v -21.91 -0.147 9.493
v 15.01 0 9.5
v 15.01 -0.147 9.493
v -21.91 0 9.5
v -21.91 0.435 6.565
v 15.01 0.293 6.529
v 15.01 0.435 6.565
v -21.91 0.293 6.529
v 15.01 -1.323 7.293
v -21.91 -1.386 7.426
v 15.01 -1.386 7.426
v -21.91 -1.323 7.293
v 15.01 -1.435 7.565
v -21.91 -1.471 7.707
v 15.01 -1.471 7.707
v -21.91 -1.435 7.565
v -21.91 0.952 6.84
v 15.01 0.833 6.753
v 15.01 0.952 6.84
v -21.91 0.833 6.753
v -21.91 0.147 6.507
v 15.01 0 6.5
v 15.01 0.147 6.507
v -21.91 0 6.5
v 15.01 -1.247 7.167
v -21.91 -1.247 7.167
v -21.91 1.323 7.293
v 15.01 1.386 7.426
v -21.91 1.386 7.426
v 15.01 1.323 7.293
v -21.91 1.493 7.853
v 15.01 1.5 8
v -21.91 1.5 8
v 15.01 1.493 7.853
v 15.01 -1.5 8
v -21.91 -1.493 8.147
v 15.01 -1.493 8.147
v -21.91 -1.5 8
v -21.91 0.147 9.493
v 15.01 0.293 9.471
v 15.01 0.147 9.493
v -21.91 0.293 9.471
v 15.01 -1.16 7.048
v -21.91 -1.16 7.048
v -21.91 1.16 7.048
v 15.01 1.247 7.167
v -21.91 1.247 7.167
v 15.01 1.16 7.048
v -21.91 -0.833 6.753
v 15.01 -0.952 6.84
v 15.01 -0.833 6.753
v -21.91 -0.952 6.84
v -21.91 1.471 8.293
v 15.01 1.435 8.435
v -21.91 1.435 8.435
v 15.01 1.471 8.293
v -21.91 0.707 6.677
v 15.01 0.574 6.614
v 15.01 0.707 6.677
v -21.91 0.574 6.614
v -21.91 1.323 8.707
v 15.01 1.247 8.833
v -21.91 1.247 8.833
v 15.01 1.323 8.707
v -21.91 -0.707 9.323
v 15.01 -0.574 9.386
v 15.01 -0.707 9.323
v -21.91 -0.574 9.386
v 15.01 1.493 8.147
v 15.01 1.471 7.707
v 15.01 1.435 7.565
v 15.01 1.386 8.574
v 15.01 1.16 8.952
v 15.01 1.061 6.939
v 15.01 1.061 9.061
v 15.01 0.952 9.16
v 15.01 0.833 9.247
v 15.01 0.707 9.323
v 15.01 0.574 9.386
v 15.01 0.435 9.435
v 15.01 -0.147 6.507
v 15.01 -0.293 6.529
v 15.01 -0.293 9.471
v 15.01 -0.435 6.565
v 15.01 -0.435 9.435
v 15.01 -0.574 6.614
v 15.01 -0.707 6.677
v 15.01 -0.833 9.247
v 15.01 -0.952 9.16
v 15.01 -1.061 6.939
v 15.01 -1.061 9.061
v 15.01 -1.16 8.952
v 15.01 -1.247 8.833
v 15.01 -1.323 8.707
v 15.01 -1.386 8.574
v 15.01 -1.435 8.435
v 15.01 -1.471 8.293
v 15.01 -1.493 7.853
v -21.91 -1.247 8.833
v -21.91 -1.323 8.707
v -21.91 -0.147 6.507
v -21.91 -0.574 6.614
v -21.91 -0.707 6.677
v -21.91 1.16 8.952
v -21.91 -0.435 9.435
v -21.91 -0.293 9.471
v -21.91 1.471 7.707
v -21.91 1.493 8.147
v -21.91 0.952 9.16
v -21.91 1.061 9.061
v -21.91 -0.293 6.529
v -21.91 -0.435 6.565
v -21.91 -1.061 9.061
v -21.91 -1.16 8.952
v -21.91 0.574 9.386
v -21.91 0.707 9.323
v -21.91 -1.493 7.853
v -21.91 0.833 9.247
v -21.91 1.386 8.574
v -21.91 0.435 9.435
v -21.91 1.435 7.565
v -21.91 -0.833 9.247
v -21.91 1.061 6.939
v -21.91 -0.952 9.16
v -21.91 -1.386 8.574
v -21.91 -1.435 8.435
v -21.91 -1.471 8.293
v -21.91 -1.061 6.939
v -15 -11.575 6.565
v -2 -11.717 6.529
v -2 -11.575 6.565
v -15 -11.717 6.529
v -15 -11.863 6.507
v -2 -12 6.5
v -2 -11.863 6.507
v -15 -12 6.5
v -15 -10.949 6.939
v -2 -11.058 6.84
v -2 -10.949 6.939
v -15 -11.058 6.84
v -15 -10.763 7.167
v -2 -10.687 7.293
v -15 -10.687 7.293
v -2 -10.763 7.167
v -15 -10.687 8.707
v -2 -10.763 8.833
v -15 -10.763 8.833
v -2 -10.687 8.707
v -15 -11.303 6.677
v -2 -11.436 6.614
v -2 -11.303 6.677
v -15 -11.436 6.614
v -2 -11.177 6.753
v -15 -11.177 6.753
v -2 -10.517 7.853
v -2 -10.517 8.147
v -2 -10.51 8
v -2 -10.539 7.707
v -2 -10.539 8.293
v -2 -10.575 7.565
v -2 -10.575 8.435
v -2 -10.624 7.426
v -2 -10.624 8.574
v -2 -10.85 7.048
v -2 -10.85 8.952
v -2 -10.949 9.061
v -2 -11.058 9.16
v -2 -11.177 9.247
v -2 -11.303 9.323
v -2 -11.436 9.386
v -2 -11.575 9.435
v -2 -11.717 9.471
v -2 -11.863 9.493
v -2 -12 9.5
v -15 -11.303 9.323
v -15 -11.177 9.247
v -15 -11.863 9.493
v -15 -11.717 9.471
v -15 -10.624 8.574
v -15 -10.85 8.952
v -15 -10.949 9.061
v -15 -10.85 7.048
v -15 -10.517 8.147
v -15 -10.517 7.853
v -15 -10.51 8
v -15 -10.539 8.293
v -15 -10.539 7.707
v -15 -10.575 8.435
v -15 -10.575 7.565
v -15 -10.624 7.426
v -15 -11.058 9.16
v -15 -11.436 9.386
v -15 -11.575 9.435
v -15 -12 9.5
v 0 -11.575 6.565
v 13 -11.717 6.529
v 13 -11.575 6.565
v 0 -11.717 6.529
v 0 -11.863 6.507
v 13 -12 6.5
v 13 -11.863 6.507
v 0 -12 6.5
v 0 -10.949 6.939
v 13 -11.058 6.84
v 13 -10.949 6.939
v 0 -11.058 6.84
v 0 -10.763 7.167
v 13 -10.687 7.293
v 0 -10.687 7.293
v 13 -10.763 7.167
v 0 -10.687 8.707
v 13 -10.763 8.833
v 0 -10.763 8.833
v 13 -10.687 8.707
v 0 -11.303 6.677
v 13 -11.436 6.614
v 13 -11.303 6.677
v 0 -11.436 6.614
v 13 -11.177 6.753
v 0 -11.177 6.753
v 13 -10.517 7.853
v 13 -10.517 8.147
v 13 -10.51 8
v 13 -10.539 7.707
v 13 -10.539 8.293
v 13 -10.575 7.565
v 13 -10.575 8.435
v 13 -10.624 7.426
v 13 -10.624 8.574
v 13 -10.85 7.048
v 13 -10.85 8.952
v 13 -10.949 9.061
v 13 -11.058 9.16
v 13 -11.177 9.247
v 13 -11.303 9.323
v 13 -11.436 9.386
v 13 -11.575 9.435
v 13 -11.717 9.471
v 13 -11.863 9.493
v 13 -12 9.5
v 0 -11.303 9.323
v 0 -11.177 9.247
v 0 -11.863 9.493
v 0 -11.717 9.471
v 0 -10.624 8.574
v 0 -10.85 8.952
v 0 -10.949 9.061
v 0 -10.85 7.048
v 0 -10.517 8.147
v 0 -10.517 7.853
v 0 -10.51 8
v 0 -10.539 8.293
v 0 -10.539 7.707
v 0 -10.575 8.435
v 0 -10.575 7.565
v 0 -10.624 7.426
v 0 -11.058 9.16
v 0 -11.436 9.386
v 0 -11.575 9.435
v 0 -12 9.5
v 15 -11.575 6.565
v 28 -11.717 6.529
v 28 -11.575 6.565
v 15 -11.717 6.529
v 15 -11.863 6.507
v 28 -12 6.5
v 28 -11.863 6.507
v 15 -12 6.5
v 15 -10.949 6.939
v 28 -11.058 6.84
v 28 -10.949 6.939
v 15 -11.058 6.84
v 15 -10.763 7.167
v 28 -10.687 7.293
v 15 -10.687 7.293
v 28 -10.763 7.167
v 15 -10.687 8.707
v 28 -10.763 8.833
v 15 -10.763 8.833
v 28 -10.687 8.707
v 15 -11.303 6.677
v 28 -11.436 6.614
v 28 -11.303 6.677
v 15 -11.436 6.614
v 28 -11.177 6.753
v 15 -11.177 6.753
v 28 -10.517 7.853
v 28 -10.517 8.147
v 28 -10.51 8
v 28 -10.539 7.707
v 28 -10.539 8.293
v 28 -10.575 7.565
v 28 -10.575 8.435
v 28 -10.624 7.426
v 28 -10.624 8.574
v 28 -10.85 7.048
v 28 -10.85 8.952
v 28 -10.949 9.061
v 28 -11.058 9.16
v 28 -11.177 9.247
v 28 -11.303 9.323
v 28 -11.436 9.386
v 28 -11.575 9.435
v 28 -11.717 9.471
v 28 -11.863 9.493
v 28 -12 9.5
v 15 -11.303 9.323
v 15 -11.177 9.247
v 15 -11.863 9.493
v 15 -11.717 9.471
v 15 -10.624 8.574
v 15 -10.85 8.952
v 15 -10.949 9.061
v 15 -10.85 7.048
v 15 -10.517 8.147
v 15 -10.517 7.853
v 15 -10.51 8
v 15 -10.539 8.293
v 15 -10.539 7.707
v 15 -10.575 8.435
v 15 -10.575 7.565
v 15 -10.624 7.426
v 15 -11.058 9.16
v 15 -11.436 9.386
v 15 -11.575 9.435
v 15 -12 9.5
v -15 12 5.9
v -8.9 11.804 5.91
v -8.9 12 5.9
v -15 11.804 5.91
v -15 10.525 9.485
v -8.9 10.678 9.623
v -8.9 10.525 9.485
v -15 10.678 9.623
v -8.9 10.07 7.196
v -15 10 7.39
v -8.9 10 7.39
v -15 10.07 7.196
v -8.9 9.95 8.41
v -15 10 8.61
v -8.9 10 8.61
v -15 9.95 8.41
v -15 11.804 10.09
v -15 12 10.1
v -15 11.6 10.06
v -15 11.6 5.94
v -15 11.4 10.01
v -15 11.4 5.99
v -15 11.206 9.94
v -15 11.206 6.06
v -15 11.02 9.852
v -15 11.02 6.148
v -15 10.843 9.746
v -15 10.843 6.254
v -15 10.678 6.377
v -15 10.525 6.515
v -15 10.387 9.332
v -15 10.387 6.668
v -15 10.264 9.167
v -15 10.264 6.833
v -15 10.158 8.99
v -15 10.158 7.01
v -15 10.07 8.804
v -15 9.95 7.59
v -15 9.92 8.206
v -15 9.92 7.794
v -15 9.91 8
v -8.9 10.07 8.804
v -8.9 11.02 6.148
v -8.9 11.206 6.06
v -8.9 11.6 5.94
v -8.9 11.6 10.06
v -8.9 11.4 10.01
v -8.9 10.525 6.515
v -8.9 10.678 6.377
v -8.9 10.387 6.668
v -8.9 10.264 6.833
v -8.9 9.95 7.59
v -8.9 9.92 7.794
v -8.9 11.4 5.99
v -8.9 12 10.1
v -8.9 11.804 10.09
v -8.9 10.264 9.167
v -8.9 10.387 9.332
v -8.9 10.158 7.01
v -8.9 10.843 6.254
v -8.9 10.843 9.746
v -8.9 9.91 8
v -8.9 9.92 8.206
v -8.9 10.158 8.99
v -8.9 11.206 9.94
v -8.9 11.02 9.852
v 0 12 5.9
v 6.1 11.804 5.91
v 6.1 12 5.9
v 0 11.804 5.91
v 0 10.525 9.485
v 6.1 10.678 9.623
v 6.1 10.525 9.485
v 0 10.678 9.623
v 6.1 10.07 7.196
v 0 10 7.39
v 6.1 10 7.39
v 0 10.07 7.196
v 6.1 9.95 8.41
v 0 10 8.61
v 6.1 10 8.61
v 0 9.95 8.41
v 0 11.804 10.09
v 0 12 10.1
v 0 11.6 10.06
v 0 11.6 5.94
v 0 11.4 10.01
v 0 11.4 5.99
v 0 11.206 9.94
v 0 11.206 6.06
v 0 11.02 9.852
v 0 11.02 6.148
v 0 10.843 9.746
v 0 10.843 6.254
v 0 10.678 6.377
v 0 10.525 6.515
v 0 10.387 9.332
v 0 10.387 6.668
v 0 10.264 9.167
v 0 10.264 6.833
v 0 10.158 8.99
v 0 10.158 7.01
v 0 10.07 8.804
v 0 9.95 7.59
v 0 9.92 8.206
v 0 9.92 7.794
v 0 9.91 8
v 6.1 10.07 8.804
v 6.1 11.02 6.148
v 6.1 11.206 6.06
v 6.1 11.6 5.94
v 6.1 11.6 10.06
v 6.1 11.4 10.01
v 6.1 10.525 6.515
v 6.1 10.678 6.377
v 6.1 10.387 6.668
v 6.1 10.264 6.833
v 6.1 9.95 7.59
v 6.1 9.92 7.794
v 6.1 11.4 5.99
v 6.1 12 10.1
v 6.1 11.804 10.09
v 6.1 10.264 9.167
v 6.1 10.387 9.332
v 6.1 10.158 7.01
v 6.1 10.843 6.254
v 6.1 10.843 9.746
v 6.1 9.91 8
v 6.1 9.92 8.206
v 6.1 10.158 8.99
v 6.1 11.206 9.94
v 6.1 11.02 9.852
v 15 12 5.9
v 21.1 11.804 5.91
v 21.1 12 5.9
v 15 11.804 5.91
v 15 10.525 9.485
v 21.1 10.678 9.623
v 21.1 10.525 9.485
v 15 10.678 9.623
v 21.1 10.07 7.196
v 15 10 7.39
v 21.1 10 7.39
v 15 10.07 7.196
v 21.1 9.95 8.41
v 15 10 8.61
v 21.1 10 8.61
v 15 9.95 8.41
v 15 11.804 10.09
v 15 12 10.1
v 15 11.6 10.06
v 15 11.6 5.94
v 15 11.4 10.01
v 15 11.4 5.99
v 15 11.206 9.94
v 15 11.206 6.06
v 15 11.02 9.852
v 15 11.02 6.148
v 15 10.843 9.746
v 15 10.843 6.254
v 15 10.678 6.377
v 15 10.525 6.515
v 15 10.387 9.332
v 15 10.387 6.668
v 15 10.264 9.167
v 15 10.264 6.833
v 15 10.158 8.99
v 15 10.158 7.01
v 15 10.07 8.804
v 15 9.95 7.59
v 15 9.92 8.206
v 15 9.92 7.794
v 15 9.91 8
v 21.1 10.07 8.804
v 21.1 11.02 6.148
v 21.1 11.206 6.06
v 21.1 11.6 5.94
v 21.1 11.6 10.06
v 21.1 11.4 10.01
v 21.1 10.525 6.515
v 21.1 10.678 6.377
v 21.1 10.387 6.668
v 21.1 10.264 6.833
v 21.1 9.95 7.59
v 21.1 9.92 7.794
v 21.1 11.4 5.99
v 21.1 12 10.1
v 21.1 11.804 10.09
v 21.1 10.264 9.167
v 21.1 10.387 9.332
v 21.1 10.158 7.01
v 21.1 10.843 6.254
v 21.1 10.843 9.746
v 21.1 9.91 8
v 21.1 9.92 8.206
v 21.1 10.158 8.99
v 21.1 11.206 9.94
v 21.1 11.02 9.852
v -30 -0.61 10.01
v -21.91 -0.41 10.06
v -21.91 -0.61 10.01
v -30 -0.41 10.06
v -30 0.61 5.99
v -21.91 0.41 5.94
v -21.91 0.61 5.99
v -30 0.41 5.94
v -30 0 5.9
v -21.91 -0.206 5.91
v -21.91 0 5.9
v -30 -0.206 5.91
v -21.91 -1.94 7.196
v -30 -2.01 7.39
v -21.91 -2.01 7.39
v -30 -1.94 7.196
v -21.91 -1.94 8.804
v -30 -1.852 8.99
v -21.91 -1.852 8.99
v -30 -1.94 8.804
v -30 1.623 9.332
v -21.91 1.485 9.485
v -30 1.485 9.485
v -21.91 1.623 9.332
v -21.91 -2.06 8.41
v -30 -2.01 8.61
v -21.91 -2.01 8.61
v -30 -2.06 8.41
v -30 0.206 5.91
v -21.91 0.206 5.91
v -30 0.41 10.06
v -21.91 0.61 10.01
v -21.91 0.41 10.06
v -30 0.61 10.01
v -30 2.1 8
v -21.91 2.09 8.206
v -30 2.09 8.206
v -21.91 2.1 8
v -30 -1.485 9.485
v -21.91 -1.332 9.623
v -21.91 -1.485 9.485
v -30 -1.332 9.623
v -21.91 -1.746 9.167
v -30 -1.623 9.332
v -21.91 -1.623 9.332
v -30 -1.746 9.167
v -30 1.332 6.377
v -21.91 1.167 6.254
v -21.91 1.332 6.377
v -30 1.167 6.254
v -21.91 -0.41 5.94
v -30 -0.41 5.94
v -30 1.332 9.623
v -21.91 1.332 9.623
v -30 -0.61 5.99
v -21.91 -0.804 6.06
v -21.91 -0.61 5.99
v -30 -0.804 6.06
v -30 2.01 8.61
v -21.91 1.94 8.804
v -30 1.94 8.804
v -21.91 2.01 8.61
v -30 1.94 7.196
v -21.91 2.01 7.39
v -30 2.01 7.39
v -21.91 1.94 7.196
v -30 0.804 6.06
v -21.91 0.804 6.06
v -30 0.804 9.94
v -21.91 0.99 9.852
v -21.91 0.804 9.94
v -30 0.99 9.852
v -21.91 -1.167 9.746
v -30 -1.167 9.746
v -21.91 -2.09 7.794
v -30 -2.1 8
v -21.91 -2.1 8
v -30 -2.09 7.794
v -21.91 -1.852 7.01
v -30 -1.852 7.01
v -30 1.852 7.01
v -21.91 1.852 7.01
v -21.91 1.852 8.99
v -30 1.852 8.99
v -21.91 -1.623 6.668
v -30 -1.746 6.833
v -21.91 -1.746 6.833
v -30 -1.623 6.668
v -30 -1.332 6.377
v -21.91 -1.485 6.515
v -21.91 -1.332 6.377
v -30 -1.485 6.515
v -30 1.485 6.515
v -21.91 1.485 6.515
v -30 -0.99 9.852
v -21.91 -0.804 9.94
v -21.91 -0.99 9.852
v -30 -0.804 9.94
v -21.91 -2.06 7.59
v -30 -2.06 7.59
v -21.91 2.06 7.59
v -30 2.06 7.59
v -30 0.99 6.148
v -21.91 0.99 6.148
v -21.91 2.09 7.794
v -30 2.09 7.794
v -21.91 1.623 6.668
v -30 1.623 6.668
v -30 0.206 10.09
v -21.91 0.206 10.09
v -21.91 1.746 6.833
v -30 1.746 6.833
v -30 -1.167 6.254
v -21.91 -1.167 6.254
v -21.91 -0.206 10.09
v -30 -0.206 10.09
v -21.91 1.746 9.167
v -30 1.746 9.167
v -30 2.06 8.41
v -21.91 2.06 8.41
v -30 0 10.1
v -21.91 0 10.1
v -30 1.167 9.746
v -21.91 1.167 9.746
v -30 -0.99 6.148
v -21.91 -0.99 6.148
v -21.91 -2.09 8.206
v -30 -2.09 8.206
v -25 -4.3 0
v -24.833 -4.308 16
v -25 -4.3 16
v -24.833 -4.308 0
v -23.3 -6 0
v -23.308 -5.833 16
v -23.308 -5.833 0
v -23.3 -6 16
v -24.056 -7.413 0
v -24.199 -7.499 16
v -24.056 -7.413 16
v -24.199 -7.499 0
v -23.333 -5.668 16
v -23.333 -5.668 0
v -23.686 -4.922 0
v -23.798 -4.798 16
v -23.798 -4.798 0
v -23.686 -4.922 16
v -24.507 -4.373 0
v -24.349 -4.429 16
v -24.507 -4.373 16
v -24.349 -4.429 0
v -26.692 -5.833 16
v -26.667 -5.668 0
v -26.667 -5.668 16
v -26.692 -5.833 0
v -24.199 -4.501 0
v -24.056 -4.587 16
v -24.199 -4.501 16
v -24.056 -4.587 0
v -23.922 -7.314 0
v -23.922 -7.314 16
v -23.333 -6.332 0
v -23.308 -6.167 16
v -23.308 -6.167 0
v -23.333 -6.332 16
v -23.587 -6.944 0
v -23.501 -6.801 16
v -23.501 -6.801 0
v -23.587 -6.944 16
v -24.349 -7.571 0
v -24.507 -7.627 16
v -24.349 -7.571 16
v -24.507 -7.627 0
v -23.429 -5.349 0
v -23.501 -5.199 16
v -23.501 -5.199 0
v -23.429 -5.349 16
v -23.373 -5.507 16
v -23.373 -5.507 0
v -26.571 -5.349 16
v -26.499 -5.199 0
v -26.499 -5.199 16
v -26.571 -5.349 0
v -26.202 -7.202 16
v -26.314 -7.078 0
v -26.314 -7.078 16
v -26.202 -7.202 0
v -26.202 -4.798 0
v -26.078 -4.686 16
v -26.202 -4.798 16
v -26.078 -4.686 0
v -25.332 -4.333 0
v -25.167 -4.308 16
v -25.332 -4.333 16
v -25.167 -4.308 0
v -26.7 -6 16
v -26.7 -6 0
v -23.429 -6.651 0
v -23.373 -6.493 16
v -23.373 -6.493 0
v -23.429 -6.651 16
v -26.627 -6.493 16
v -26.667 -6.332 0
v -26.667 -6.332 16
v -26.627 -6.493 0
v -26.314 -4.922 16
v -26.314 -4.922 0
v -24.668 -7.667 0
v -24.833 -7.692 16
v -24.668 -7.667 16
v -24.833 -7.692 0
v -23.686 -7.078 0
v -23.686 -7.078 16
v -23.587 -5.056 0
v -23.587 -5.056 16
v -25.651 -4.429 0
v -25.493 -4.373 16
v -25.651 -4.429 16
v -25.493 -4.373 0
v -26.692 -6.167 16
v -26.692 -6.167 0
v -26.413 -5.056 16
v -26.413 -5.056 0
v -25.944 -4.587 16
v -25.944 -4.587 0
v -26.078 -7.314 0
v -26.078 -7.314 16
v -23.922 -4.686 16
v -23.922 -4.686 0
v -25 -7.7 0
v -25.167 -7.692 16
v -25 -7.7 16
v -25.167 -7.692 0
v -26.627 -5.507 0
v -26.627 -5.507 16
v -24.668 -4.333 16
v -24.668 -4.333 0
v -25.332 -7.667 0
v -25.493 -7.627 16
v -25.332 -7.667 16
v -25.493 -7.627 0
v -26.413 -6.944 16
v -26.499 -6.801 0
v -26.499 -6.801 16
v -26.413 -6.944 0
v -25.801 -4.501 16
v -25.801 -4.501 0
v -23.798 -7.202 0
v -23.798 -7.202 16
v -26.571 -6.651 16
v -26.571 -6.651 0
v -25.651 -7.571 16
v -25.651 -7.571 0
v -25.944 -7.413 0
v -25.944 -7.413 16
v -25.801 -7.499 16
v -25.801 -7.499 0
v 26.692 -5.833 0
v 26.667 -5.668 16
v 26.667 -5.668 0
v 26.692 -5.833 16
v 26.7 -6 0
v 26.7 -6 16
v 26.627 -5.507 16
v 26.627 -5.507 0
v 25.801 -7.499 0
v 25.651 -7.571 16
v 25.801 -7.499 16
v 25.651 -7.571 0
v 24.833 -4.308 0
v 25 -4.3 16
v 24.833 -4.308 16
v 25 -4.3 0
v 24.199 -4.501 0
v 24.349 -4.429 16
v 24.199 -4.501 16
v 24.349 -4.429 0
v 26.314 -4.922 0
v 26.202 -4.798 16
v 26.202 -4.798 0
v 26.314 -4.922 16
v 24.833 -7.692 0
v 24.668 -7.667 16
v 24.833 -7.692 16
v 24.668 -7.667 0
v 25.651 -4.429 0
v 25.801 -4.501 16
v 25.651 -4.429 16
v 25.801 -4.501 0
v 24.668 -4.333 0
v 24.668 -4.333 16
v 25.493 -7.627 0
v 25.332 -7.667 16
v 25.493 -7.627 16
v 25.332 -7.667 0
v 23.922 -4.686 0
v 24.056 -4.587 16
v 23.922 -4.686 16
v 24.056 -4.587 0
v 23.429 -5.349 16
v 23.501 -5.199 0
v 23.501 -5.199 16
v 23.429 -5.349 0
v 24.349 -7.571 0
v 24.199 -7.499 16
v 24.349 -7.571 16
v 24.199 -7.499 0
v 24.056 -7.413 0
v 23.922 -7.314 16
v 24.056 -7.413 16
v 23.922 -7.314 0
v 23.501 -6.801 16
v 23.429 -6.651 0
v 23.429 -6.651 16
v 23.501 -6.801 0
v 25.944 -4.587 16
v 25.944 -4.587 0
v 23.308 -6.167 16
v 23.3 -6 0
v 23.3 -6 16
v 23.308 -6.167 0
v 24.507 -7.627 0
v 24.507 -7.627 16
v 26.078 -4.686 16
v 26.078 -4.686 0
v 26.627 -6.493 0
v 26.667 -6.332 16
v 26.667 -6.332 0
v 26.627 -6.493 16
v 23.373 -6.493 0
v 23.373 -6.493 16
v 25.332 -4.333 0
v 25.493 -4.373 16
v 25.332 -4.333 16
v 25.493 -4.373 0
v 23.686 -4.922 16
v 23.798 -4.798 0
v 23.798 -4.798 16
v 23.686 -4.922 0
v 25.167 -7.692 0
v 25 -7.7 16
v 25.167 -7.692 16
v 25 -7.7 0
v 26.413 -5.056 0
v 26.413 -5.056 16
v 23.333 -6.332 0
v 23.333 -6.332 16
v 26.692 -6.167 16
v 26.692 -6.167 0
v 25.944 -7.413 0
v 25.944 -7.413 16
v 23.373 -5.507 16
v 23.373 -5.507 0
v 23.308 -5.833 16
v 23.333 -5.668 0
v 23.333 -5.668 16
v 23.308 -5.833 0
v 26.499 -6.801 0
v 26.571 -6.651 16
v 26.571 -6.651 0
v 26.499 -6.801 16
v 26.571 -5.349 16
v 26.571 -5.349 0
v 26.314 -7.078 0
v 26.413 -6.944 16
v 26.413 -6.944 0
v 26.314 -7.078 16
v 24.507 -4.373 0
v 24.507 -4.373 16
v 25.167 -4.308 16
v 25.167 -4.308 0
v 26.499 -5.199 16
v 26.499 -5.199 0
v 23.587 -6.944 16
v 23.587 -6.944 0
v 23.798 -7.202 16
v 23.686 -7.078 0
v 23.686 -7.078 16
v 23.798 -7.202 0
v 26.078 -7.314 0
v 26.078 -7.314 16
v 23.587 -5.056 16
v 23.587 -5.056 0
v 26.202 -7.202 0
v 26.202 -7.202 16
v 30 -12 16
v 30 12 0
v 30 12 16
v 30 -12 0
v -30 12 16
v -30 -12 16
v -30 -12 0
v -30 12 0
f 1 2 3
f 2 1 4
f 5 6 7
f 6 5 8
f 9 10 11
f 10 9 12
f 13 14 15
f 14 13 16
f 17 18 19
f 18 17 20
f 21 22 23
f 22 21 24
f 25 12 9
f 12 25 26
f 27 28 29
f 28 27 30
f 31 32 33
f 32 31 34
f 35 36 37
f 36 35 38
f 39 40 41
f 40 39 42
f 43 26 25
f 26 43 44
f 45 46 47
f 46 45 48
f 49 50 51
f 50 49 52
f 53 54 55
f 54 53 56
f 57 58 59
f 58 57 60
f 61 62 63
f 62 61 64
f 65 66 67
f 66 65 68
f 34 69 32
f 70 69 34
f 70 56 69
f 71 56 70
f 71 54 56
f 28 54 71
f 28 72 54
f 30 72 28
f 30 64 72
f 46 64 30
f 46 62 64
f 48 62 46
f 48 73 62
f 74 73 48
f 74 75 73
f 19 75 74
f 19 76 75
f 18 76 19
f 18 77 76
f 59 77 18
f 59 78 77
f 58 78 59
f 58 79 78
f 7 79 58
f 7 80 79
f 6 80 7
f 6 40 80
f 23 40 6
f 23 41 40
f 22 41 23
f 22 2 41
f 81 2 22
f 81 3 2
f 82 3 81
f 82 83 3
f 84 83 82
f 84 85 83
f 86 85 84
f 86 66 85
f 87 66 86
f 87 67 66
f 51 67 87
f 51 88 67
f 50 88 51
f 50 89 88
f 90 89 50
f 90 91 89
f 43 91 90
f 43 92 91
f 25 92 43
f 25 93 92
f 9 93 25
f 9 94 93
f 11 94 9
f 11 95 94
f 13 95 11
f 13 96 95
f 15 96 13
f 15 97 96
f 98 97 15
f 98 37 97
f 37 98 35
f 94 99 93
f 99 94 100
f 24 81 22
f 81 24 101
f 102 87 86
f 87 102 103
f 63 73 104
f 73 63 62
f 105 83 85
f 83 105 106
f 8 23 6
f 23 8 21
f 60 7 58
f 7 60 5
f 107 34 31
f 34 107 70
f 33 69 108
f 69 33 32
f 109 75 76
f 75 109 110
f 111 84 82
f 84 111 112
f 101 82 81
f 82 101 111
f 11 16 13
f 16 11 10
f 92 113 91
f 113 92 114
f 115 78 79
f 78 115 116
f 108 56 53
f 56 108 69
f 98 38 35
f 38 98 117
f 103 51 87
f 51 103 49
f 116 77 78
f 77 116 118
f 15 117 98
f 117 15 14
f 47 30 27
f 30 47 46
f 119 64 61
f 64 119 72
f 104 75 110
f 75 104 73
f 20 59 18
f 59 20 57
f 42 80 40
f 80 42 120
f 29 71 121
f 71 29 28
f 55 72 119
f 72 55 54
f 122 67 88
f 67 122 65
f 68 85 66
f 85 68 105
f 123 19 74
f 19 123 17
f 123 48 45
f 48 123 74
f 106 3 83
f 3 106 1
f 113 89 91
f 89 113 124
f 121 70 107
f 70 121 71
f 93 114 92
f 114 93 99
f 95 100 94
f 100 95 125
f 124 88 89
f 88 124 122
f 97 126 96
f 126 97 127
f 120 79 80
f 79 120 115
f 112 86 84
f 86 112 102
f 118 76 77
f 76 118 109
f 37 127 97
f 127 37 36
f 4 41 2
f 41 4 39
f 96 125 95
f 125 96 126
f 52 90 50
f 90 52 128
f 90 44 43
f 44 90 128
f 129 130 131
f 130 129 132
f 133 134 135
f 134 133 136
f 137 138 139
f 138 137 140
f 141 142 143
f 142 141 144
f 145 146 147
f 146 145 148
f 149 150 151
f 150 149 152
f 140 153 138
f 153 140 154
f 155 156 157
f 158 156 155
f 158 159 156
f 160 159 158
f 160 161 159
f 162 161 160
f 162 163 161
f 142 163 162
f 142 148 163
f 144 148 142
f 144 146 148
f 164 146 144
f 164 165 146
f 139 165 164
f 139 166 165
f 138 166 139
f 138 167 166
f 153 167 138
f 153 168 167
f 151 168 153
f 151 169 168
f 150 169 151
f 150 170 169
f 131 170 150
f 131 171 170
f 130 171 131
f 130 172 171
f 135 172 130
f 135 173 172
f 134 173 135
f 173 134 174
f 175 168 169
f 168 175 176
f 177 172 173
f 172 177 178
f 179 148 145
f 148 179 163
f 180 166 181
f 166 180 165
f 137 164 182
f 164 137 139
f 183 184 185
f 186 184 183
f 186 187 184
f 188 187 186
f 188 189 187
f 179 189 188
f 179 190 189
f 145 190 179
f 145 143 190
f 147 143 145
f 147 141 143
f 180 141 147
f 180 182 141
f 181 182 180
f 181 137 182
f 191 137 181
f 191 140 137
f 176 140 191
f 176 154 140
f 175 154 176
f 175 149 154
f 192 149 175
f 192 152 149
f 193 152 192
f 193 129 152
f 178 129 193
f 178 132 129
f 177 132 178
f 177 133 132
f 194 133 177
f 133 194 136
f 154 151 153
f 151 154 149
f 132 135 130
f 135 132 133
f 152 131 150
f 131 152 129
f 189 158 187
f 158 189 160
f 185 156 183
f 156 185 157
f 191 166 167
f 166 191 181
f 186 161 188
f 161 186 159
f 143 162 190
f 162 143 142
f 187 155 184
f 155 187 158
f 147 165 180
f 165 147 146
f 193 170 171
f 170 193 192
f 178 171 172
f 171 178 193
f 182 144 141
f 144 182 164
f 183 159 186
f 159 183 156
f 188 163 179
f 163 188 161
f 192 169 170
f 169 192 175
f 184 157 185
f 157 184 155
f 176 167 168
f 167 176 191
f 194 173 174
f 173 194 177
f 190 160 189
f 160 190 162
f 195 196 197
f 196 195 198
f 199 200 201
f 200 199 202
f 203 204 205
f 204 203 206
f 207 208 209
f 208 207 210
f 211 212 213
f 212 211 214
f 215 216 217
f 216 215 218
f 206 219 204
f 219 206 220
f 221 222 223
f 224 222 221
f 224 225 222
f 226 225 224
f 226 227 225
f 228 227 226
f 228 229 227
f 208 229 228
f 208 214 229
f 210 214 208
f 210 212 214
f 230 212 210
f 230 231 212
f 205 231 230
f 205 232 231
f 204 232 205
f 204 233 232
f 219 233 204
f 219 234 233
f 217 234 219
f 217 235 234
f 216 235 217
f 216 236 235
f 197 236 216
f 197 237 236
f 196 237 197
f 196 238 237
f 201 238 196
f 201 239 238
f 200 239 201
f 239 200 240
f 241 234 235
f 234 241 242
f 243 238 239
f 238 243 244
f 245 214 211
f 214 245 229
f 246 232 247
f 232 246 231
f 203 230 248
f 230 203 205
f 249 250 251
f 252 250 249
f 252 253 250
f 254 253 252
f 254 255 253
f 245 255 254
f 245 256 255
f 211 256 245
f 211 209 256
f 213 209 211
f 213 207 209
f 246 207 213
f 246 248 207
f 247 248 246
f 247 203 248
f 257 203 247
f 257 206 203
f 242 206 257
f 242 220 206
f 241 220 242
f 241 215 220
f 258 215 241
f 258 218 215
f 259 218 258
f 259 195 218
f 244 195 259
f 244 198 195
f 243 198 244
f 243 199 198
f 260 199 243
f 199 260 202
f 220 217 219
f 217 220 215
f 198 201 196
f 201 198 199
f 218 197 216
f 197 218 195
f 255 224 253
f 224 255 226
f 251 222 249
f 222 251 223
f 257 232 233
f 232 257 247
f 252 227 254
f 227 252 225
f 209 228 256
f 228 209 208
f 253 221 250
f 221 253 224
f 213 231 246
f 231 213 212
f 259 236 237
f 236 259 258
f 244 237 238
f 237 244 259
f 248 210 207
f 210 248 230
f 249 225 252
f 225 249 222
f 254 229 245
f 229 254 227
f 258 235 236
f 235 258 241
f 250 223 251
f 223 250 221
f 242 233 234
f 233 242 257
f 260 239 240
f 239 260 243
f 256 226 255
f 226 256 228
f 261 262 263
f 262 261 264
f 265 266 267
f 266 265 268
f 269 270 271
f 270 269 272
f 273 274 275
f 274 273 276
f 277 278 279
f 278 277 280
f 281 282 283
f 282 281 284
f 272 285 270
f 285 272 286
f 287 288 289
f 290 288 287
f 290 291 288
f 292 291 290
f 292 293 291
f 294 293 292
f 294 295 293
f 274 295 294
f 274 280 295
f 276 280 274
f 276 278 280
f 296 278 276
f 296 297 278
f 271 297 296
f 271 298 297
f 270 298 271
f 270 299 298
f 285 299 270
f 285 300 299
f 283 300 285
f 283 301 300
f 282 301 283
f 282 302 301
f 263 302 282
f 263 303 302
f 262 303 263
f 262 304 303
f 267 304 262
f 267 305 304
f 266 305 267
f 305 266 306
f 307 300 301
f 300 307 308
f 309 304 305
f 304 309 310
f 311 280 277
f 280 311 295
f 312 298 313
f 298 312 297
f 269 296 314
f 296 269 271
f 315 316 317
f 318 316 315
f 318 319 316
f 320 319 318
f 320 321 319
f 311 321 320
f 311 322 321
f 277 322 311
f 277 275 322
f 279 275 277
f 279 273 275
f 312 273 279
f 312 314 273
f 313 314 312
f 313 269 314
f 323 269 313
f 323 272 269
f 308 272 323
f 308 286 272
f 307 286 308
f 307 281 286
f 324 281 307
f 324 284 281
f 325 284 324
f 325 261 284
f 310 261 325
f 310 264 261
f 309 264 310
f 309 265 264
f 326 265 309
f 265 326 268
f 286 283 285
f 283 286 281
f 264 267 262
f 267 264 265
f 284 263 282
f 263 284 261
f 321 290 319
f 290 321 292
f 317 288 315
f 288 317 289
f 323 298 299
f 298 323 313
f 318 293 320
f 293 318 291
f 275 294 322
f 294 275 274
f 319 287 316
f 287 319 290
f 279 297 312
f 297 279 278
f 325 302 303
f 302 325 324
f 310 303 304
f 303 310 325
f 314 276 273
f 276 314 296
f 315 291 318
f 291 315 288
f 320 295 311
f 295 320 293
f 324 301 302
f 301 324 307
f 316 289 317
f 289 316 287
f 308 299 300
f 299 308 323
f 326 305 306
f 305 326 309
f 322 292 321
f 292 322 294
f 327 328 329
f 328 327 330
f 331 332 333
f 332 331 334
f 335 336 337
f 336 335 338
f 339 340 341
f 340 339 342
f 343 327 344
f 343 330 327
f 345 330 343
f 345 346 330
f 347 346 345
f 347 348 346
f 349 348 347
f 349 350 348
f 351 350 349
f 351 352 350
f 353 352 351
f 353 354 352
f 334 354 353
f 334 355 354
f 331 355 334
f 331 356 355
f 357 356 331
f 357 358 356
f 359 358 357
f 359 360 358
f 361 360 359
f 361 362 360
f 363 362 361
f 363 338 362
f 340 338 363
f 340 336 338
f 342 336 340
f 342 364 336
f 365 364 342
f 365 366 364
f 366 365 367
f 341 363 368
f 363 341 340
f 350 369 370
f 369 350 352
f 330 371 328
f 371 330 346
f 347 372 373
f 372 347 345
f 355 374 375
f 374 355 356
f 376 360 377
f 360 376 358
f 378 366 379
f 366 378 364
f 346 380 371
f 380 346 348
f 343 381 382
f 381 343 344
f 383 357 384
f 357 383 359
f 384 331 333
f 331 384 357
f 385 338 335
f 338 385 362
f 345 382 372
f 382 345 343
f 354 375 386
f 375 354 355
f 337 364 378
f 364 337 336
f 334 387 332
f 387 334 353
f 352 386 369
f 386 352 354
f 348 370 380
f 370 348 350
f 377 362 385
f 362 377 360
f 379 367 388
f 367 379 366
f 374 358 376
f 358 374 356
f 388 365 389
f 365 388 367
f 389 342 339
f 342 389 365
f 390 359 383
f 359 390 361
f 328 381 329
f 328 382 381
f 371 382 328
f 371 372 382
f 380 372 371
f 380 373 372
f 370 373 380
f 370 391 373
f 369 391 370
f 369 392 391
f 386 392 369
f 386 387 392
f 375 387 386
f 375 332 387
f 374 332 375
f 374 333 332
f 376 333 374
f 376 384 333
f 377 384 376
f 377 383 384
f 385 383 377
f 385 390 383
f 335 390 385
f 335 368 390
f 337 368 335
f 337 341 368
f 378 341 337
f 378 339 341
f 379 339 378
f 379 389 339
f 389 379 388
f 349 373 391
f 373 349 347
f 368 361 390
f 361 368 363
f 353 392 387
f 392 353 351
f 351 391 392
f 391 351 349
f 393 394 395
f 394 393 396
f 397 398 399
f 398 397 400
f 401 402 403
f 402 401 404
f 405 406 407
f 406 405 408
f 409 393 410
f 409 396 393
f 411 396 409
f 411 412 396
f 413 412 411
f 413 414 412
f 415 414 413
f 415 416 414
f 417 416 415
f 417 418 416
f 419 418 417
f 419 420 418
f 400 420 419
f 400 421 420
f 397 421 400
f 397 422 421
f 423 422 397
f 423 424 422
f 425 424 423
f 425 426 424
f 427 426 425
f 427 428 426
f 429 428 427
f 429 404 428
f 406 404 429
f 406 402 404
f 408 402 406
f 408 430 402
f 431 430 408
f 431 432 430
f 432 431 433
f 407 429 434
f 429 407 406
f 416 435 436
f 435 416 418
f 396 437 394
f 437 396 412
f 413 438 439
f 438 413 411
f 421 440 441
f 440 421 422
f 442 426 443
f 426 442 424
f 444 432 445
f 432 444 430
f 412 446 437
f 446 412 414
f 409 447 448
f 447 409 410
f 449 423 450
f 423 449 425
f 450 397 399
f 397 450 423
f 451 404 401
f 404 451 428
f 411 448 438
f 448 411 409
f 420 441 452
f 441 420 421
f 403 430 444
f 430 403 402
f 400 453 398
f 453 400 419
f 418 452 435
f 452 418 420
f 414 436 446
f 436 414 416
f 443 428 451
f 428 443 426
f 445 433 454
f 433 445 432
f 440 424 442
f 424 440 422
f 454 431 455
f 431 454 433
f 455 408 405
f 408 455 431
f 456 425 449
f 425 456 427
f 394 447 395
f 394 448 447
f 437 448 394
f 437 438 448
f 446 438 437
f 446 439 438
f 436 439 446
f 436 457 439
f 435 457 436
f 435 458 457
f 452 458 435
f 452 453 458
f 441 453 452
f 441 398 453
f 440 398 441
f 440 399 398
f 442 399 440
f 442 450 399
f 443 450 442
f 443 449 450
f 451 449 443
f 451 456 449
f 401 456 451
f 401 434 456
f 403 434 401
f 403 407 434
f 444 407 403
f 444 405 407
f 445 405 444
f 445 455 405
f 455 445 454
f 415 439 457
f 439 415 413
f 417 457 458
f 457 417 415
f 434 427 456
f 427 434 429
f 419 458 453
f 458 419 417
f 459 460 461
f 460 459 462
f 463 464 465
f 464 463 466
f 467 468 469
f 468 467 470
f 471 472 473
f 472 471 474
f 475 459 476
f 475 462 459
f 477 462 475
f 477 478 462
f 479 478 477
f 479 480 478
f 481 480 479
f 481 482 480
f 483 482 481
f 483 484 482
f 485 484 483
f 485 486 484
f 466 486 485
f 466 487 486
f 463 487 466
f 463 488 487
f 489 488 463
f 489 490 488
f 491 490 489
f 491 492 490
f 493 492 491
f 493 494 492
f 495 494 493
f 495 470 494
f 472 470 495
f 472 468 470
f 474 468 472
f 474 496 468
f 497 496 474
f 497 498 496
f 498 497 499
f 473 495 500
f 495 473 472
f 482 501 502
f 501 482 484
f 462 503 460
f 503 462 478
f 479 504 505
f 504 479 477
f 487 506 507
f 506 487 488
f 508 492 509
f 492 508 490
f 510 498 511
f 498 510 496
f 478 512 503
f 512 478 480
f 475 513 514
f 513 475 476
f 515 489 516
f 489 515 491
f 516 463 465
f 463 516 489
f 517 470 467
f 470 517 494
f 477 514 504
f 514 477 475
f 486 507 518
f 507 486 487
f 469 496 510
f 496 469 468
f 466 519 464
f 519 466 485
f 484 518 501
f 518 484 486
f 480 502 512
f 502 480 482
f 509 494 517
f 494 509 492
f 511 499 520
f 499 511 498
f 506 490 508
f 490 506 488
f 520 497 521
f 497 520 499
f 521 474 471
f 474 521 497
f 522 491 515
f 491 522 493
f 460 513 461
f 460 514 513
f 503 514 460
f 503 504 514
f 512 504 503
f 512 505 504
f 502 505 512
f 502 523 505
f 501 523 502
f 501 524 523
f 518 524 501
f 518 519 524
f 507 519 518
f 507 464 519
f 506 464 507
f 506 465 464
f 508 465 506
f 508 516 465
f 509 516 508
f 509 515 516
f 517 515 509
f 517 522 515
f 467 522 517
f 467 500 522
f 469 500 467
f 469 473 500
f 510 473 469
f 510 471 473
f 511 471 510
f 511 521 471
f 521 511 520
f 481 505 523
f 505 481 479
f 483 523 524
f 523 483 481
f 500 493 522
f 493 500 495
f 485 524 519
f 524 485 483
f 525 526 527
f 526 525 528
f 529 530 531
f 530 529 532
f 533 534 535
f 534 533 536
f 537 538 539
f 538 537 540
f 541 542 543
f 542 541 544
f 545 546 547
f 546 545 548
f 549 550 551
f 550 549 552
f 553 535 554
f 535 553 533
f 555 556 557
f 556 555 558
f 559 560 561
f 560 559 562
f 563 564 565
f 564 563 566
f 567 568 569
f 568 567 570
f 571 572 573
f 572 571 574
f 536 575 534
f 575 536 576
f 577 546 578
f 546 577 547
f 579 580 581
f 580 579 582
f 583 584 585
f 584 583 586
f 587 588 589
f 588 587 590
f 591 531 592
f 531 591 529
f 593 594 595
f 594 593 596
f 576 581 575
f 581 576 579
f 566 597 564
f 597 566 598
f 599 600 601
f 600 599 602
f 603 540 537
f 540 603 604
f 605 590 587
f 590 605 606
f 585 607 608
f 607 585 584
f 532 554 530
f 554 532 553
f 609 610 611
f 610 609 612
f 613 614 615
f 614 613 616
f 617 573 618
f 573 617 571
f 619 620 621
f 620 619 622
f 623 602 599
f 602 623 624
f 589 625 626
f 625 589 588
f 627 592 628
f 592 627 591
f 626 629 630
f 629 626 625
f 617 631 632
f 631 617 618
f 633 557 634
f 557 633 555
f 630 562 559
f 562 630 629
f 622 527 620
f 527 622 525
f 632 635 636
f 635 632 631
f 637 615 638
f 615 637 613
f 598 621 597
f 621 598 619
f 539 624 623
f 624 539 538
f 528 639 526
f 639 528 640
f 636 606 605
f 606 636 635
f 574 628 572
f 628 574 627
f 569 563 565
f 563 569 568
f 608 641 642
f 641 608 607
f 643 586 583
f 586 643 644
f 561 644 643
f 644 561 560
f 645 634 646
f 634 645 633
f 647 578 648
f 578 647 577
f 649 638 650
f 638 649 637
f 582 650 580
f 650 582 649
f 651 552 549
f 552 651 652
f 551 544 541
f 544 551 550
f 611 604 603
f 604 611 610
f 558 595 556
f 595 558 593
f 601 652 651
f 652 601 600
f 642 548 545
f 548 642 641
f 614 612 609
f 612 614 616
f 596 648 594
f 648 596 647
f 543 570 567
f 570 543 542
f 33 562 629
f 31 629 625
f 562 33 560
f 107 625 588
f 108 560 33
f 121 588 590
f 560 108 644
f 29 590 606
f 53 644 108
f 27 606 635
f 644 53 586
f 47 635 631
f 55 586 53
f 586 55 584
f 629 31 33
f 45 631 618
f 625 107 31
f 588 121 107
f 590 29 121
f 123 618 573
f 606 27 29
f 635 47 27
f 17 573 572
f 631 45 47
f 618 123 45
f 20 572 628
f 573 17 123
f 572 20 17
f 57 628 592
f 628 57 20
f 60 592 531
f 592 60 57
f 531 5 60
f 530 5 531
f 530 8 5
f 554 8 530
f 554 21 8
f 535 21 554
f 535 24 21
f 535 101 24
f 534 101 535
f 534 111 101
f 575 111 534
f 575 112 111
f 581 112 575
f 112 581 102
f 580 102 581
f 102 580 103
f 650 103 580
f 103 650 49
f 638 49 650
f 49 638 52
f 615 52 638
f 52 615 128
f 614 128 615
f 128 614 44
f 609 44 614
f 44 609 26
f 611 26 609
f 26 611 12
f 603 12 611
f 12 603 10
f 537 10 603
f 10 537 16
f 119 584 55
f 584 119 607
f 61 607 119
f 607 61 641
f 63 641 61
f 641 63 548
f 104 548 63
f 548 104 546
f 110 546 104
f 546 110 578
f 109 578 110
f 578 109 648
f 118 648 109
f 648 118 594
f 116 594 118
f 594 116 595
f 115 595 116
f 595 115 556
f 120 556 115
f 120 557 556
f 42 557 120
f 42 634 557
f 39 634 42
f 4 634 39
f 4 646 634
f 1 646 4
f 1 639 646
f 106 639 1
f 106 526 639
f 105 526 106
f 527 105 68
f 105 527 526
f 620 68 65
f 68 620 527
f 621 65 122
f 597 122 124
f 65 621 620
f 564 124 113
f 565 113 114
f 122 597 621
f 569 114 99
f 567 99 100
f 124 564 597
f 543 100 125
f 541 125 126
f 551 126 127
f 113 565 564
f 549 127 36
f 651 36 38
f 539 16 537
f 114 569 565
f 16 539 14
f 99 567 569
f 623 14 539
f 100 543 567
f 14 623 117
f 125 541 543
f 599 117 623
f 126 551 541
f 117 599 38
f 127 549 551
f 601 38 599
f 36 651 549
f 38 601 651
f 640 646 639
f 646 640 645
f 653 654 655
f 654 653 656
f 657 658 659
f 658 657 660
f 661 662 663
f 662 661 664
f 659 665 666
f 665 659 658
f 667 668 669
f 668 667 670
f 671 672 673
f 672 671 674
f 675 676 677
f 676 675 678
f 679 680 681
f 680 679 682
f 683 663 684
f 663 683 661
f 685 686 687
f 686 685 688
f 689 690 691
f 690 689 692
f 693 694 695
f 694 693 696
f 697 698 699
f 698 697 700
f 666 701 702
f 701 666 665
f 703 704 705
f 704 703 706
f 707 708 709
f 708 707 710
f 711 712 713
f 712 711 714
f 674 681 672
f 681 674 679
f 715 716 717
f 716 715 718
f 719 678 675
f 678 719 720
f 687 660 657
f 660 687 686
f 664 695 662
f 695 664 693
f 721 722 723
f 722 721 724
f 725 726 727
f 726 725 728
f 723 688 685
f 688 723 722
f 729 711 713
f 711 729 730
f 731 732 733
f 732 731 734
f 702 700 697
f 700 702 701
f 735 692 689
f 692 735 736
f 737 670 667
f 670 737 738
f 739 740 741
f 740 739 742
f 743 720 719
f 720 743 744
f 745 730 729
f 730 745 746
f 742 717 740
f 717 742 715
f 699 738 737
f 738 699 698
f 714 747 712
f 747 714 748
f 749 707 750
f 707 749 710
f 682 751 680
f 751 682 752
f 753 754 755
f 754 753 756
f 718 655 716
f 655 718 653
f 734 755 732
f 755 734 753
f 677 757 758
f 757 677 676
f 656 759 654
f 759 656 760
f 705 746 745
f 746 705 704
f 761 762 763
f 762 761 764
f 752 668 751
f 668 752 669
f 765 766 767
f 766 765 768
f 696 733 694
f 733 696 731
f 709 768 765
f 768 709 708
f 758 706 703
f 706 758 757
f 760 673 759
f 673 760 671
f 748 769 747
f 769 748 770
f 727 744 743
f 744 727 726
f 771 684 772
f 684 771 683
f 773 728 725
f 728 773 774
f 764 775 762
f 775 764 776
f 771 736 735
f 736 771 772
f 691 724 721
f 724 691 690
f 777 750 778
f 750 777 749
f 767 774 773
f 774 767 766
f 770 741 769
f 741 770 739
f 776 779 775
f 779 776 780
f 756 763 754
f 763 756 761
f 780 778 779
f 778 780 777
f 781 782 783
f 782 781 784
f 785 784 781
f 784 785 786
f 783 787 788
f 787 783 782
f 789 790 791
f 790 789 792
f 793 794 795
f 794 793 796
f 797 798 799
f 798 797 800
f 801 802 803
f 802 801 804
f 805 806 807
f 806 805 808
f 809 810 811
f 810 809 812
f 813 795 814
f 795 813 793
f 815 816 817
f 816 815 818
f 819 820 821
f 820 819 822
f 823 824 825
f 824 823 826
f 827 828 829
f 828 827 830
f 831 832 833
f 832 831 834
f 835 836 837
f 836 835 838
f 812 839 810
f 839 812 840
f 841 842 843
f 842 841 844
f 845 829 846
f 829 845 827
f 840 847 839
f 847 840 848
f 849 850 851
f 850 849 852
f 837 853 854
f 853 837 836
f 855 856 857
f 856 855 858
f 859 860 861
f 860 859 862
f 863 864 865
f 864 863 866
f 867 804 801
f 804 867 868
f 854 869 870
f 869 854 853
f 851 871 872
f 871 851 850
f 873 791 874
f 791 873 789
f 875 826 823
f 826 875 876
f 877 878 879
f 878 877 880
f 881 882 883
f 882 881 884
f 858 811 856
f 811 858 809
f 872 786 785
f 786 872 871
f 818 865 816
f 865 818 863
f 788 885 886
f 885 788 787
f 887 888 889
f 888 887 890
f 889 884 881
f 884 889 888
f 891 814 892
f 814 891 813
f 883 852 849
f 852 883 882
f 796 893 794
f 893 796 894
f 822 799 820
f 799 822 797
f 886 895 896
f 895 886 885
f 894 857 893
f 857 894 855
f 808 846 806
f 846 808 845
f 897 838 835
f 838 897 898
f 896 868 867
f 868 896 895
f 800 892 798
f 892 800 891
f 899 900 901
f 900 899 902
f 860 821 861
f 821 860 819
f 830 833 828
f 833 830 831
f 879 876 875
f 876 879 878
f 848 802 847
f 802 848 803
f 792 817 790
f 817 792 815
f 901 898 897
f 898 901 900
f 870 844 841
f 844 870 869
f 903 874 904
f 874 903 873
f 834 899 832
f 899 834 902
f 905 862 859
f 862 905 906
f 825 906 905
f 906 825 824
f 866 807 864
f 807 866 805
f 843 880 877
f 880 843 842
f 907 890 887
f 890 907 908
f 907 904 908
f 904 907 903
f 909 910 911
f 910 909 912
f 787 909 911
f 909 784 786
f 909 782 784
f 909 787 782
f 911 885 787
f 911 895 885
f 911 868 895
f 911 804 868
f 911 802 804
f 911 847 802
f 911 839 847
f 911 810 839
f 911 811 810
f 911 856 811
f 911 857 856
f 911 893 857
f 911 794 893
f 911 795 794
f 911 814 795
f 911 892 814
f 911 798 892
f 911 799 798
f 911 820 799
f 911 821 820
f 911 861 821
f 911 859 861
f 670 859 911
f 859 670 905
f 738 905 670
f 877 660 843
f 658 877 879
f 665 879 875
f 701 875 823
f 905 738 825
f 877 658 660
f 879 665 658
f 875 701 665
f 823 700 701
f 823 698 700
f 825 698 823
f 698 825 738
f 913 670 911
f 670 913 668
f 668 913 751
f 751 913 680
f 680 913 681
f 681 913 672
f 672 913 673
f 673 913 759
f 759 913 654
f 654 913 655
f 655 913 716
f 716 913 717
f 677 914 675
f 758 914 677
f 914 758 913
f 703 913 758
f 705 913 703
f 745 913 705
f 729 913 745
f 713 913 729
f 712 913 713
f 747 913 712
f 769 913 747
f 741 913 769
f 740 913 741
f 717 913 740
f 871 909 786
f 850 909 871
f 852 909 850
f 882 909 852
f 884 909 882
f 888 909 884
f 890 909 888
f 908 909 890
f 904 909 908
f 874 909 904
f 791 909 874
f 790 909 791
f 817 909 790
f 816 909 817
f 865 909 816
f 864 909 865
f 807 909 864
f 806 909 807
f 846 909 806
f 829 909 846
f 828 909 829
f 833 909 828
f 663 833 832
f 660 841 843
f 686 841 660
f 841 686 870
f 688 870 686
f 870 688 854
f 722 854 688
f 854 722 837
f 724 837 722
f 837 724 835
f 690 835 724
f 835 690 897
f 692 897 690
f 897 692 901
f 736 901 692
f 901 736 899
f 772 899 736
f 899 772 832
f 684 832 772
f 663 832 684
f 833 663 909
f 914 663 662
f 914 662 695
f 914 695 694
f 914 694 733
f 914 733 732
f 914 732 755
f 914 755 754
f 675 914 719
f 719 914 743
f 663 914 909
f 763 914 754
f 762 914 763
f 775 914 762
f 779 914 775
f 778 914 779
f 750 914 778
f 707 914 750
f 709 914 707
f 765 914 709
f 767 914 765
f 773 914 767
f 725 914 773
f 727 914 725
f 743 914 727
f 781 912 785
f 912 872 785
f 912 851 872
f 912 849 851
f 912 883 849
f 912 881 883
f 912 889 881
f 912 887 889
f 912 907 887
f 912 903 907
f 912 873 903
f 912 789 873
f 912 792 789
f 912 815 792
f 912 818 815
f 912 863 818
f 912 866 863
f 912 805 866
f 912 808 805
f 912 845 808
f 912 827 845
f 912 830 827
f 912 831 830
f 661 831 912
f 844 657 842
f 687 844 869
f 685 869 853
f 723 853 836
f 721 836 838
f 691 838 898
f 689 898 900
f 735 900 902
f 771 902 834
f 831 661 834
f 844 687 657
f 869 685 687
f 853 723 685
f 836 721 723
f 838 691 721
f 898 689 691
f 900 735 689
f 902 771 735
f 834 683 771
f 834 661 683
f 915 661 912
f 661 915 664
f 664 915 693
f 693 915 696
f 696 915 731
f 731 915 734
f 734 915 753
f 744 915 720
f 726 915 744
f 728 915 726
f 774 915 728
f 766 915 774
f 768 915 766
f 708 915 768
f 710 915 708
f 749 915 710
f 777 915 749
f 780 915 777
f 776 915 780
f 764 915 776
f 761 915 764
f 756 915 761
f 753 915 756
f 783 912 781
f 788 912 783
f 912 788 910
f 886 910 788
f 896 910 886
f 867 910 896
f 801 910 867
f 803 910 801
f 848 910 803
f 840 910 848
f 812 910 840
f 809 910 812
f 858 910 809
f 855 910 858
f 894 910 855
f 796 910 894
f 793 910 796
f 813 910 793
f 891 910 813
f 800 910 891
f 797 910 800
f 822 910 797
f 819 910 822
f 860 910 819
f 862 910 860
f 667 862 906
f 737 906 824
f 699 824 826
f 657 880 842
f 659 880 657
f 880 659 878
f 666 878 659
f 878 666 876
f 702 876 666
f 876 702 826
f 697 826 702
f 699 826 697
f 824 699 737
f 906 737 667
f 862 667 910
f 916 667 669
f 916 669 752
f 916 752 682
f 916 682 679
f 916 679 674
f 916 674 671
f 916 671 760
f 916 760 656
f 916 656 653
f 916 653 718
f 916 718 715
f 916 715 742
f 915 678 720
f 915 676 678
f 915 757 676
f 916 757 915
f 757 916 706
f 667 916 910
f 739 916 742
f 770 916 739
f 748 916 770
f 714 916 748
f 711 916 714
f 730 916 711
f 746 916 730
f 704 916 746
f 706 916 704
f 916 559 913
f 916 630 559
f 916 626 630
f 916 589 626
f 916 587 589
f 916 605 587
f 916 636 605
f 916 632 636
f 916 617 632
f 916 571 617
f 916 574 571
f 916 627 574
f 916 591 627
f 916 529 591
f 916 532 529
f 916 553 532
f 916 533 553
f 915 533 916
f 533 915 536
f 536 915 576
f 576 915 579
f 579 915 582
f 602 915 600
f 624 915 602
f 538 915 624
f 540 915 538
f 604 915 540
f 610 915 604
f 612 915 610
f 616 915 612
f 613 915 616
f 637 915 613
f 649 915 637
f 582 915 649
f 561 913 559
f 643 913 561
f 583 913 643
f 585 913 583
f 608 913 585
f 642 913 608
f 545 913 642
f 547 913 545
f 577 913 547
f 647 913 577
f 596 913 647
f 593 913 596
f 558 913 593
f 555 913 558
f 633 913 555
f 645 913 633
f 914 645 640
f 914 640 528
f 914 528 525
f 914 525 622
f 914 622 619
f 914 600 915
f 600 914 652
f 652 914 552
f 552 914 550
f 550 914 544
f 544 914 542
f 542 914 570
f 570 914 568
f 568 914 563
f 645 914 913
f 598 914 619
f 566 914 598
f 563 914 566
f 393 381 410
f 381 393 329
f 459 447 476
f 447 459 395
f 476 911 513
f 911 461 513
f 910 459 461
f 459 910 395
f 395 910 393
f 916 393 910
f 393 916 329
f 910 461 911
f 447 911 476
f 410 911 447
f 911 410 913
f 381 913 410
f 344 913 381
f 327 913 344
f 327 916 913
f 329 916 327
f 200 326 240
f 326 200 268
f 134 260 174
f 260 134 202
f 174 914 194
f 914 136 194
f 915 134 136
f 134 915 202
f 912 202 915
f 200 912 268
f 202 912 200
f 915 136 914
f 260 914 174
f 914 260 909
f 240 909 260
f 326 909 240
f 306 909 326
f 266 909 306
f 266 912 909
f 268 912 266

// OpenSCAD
// Manifold block: Splits one tubing line into three.
// Dimensions: 60mm (X) x 24mm (Y) x 16mm (Z)
// Features: 1 inlet, 3 outlets, 1 main internal channel, 2 screw holes.

// --- Dimensions ---
L = 60.0;            // Length (X)
W = 24.0;            // Width (Y)
H = 16.0;            // Height (Z)

channel_d = 3.0;     // Diameter of internal channels
inlet_d = 4.2;       // Diameter of inlet socket
inlet_depth = 8.0;   // Depth of inlet socket
outlet_d = 4.2;     // Diameter of outlet socket
outlet_depth = 6.0;  // Depth of outlet socket

screw_d = 3.4;       // Diameter of M3 screw holes
screw_x_pos = 25.0;  // X position of screw holes
screw_y_pos = -6.0;  // Y position of screw holes

// --- Constants & Setup ---
$fn = 64;
z_mid = H / 2;       // Mid-plane Z = 8

// --- Geometry Construction ---

module block() {
    translate([-L/2, -W/2, 0])
        cube([L, W, H]);
}

module manifold_channels() {
    // Main channel: runs from -X end to x = 15
    // The block is centered on X, so -X end is at -30.
    // The channel runs from x = -30 to x = 15.
    translate([-L/2 + 0.01, 0, z_mid])
        rotate([0, 90, 0])
            cylinder(h = 15 + 30, d = channel_d); // +30 to ensure it reaches the end face

    // Outlet 1: at x = -15, runs in +Y
    translate([-15, -W/2 - 0.01, z_mid])
        rotate([0, 90, 0])
            cylinder(h = W/2 + 1, d = channel_d);

    // Outlet 2: at x = 0, runs in +Y
    translate([0, -W/2 - 0.01, z_mid])
        rotate([0, 90, 0])
            cylinder(h = W/2 + 1, d = channel_d);

    // Outlet 3: at x = 15, runs in +Y
    translate([15, -W/2 - 0.01, z_mid])
        rotate([0, 90, 0])
            cylinder(h = W/2 + 1, d = channel_d);
}

module sockets() {
    // Inlet socket at -X end face, y = 0
    // Note: User says "at the -X end face at y = 0". 
    // In a centered block, -X end is x = -30. 
    // If it's at y=0, it's centered on the Y axis.
    translate([-L/2 - 0.01, 0, z_mid])
        rotate([0, 90, 0])
            cylinder(h = inlet_depth + 0.1, d = inlet_d);

    // Outlet sockets at +Y face
    // Outlet 1 (x=-15), Outlet 2 (x=0), Outlet 3 (x=15)
    for (sx = [-15, 0, 15]) {
        translate([sx, W/2 + 0.01, z_mid])
            rotate([0, 90, 0])
                cylinder(h = outlet_depth + 0.1, d = outlet_d);
    }
}

module screw_holes() {
    // Two 3.4mm vertical through-holes at x = -25 and 25, y = -6
    for (sx = [-screw_x_pos, screw_x_pos]) {
        translate([sx, screw_y_pos, -0.01])
            cylinder(h = H + 0.02, d = screw_d);
    }
}

// --- Final Assembly ---

difference() {
    block();
    manifold_channels();
    sockets();
    screw_holes();
}
